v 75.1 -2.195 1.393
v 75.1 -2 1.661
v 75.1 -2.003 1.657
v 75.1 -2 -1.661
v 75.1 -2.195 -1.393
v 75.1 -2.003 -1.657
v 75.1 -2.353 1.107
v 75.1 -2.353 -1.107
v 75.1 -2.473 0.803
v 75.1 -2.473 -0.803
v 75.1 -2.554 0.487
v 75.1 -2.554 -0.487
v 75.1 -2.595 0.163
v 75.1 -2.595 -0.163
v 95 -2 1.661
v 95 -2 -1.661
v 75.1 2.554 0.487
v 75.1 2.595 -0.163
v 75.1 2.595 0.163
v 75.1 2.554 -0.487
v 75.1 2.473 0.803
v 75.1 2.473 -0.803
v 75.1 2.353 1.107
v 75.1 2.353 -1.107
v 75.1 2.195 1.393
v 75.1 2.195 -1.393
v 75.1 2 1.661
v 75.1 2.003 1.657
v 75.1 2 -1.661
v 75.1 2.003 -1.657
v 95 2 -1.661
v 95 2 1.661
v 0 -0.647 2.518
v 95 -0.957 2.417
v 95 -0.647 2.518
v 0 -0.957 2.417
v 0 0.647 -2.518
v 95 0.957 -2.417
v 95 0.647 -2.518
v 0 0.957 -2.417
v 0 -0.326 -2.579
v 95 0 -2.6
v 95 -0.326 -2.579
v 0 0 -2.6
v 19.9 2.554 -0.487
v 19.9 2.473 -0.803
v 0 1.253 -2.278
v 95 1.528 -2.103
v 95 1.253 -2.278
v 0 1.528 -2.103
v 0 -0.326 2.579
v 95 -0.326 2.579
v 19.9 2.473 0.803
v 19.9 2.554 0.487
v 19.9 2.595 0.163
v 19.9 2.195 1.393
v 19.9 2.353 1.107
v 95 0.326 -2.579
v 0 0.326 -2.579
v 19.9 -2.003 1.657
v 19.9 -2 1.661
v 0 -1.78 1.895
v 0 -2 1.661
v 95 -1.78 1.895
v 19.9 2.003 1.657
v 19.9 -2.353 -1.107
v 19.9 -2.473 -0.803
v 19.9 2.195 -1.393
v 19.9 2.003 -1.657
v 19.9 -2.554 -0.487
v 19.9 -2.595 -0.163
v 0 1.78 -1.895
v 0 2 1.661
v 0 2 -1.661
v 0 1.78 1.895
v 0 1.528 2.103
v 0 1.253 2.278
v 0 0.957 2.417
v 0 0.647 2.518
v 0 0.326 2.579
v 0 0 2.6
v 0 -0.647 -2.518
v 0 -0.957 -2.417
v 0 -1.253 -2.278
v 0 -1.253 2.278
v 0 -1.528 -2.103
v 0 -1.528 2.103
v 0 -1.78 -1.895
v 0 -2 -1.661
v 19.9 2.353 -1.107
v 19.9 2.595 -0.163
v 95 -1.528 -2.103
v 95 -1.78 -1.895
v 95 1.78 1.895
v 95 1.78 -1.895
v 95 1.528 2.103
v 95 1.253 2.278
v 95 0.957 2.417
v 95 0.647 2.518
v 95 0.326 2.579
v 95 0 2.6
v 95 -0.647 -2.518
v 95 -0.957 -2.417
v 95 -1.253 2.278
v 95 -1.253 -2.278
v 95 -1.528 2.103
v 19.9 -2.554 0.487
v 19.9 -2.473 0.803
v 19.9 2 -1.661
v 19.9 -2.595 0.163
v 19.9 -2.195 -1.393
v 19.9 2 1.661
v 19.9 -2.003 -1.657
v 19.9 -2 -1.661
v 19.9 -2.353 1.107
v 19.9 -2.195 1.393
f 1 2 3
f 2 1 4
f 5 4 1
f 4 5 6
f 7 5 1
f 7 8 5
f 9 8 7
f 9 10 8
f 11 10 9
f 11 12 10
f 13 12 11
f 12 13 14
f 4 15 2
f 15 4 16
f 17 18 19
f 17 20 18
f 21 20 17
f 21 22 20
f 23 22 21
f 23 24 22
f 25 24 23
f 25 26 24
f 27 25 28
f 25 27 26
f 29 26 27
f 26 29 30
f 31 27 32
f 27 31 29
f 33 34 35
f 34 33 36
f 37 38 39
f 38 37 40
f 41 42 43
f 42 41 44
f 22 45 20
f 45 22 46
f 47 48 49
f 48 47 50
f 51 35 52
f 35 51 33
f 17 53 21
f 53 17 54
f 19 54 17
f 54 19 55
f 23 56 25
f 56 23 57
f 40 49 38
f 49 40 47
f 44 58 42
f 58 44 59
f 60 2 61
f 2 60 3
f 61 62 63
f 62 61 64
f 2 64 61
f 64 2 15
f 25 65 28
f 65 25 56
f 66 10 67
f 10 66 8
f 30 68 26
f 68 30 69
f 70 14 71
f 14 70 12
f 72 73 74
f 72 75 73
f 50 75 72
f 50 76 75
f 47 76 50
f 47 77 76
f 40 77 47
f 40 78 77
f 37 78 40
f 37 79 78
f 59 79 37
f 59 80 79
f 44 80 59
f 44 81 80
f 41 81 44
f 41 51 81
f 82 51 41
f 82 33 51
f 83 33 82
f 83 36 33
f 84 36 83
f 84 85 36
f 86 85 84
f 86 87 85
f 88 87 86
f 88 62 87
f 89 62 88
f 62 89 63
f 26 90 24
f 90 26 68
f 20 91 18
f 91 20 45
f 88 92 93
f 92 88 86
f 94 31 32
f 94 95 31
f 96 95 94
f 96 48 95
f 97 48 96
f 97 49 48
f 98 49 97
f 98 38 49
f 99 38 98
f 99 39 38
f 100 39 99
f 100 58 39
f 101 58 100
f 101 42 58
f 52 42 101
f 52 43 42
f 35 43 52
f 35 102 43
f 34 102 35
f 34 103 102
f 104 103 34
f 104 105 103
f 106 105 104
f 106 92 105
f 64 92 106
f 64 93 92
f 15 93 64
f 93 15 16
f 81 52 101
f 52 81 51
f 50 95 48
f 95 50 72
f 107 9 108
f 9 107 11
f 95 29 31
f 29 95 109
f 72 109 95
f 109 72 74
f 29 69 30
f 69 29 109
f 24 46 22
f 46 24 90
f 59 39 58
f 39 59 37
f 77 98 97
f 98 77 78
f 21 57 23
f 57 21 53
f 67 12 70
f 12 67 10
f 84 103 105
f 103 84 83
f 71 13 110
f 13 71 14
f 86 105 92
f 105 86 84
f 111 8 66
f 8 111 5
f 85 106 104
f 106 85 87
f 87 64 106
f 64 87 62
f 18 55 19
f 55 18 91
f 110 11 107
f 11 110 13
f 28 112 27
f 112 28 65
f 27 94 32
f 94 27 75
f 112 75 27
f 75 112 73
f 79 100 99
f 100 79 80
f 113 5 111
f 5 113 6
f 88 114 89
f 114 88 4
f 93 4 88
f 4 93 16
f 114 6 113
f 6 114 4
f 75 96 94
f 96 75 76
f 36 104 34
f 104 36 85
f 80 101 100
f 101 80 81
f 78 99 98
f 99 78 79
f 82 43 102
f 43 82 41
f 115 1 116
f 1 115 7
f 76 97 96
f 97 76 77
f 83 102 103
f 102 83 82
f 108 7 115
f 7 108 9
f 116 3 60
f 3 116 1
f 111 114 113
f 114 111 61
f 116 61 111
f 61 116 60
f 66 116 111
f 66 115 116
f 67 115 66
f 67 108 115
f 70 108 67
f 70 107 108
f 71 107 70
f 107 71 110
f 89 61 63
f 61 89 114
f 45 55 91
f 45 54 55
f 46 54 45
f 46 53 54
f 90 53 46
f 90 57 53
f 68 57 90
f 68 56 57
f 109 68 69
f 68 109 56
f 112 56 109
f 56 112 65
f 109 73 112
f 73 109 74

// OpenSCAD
$fn=50;

module axle(
  axle_length = 95,
  axle_radius = 2.6,
  notch_length = 20,
  notch_cutout = 2,
  fitted_sides = 2
)
{
cutout1 = -notch_cutout;
cutout2 = notch_cutout;

difference() {
      // axle
     rotate([0,90,0])
     cylinder(axle_length, r = axle_radius);
    
    if (fitted_sides ==  2) {
    // axle notch
    translate([axle_length - notch_length + .1, cutout1 - axle_radius, -axle_radius])
    cube([notch_length, axle_radius, 2 * axle_radius]);
    translate([axle_length - notch_length + .1, cutout2, -axle_radius])
    cube([notch_length, axle_radius, 2 * axle_radius]);
    }
     
     // axle notch
    translate([-.1, cutout1 - axle_radius, -axle_radius])
    cube([notch_length, axle_radius, 2 * axle_radius]);
    translate([ -.1, cutout2, -axle_radius])
    cube([notch_length,  axle_radius, 2 * axle_radius]);    
  }
}
 
axle();
